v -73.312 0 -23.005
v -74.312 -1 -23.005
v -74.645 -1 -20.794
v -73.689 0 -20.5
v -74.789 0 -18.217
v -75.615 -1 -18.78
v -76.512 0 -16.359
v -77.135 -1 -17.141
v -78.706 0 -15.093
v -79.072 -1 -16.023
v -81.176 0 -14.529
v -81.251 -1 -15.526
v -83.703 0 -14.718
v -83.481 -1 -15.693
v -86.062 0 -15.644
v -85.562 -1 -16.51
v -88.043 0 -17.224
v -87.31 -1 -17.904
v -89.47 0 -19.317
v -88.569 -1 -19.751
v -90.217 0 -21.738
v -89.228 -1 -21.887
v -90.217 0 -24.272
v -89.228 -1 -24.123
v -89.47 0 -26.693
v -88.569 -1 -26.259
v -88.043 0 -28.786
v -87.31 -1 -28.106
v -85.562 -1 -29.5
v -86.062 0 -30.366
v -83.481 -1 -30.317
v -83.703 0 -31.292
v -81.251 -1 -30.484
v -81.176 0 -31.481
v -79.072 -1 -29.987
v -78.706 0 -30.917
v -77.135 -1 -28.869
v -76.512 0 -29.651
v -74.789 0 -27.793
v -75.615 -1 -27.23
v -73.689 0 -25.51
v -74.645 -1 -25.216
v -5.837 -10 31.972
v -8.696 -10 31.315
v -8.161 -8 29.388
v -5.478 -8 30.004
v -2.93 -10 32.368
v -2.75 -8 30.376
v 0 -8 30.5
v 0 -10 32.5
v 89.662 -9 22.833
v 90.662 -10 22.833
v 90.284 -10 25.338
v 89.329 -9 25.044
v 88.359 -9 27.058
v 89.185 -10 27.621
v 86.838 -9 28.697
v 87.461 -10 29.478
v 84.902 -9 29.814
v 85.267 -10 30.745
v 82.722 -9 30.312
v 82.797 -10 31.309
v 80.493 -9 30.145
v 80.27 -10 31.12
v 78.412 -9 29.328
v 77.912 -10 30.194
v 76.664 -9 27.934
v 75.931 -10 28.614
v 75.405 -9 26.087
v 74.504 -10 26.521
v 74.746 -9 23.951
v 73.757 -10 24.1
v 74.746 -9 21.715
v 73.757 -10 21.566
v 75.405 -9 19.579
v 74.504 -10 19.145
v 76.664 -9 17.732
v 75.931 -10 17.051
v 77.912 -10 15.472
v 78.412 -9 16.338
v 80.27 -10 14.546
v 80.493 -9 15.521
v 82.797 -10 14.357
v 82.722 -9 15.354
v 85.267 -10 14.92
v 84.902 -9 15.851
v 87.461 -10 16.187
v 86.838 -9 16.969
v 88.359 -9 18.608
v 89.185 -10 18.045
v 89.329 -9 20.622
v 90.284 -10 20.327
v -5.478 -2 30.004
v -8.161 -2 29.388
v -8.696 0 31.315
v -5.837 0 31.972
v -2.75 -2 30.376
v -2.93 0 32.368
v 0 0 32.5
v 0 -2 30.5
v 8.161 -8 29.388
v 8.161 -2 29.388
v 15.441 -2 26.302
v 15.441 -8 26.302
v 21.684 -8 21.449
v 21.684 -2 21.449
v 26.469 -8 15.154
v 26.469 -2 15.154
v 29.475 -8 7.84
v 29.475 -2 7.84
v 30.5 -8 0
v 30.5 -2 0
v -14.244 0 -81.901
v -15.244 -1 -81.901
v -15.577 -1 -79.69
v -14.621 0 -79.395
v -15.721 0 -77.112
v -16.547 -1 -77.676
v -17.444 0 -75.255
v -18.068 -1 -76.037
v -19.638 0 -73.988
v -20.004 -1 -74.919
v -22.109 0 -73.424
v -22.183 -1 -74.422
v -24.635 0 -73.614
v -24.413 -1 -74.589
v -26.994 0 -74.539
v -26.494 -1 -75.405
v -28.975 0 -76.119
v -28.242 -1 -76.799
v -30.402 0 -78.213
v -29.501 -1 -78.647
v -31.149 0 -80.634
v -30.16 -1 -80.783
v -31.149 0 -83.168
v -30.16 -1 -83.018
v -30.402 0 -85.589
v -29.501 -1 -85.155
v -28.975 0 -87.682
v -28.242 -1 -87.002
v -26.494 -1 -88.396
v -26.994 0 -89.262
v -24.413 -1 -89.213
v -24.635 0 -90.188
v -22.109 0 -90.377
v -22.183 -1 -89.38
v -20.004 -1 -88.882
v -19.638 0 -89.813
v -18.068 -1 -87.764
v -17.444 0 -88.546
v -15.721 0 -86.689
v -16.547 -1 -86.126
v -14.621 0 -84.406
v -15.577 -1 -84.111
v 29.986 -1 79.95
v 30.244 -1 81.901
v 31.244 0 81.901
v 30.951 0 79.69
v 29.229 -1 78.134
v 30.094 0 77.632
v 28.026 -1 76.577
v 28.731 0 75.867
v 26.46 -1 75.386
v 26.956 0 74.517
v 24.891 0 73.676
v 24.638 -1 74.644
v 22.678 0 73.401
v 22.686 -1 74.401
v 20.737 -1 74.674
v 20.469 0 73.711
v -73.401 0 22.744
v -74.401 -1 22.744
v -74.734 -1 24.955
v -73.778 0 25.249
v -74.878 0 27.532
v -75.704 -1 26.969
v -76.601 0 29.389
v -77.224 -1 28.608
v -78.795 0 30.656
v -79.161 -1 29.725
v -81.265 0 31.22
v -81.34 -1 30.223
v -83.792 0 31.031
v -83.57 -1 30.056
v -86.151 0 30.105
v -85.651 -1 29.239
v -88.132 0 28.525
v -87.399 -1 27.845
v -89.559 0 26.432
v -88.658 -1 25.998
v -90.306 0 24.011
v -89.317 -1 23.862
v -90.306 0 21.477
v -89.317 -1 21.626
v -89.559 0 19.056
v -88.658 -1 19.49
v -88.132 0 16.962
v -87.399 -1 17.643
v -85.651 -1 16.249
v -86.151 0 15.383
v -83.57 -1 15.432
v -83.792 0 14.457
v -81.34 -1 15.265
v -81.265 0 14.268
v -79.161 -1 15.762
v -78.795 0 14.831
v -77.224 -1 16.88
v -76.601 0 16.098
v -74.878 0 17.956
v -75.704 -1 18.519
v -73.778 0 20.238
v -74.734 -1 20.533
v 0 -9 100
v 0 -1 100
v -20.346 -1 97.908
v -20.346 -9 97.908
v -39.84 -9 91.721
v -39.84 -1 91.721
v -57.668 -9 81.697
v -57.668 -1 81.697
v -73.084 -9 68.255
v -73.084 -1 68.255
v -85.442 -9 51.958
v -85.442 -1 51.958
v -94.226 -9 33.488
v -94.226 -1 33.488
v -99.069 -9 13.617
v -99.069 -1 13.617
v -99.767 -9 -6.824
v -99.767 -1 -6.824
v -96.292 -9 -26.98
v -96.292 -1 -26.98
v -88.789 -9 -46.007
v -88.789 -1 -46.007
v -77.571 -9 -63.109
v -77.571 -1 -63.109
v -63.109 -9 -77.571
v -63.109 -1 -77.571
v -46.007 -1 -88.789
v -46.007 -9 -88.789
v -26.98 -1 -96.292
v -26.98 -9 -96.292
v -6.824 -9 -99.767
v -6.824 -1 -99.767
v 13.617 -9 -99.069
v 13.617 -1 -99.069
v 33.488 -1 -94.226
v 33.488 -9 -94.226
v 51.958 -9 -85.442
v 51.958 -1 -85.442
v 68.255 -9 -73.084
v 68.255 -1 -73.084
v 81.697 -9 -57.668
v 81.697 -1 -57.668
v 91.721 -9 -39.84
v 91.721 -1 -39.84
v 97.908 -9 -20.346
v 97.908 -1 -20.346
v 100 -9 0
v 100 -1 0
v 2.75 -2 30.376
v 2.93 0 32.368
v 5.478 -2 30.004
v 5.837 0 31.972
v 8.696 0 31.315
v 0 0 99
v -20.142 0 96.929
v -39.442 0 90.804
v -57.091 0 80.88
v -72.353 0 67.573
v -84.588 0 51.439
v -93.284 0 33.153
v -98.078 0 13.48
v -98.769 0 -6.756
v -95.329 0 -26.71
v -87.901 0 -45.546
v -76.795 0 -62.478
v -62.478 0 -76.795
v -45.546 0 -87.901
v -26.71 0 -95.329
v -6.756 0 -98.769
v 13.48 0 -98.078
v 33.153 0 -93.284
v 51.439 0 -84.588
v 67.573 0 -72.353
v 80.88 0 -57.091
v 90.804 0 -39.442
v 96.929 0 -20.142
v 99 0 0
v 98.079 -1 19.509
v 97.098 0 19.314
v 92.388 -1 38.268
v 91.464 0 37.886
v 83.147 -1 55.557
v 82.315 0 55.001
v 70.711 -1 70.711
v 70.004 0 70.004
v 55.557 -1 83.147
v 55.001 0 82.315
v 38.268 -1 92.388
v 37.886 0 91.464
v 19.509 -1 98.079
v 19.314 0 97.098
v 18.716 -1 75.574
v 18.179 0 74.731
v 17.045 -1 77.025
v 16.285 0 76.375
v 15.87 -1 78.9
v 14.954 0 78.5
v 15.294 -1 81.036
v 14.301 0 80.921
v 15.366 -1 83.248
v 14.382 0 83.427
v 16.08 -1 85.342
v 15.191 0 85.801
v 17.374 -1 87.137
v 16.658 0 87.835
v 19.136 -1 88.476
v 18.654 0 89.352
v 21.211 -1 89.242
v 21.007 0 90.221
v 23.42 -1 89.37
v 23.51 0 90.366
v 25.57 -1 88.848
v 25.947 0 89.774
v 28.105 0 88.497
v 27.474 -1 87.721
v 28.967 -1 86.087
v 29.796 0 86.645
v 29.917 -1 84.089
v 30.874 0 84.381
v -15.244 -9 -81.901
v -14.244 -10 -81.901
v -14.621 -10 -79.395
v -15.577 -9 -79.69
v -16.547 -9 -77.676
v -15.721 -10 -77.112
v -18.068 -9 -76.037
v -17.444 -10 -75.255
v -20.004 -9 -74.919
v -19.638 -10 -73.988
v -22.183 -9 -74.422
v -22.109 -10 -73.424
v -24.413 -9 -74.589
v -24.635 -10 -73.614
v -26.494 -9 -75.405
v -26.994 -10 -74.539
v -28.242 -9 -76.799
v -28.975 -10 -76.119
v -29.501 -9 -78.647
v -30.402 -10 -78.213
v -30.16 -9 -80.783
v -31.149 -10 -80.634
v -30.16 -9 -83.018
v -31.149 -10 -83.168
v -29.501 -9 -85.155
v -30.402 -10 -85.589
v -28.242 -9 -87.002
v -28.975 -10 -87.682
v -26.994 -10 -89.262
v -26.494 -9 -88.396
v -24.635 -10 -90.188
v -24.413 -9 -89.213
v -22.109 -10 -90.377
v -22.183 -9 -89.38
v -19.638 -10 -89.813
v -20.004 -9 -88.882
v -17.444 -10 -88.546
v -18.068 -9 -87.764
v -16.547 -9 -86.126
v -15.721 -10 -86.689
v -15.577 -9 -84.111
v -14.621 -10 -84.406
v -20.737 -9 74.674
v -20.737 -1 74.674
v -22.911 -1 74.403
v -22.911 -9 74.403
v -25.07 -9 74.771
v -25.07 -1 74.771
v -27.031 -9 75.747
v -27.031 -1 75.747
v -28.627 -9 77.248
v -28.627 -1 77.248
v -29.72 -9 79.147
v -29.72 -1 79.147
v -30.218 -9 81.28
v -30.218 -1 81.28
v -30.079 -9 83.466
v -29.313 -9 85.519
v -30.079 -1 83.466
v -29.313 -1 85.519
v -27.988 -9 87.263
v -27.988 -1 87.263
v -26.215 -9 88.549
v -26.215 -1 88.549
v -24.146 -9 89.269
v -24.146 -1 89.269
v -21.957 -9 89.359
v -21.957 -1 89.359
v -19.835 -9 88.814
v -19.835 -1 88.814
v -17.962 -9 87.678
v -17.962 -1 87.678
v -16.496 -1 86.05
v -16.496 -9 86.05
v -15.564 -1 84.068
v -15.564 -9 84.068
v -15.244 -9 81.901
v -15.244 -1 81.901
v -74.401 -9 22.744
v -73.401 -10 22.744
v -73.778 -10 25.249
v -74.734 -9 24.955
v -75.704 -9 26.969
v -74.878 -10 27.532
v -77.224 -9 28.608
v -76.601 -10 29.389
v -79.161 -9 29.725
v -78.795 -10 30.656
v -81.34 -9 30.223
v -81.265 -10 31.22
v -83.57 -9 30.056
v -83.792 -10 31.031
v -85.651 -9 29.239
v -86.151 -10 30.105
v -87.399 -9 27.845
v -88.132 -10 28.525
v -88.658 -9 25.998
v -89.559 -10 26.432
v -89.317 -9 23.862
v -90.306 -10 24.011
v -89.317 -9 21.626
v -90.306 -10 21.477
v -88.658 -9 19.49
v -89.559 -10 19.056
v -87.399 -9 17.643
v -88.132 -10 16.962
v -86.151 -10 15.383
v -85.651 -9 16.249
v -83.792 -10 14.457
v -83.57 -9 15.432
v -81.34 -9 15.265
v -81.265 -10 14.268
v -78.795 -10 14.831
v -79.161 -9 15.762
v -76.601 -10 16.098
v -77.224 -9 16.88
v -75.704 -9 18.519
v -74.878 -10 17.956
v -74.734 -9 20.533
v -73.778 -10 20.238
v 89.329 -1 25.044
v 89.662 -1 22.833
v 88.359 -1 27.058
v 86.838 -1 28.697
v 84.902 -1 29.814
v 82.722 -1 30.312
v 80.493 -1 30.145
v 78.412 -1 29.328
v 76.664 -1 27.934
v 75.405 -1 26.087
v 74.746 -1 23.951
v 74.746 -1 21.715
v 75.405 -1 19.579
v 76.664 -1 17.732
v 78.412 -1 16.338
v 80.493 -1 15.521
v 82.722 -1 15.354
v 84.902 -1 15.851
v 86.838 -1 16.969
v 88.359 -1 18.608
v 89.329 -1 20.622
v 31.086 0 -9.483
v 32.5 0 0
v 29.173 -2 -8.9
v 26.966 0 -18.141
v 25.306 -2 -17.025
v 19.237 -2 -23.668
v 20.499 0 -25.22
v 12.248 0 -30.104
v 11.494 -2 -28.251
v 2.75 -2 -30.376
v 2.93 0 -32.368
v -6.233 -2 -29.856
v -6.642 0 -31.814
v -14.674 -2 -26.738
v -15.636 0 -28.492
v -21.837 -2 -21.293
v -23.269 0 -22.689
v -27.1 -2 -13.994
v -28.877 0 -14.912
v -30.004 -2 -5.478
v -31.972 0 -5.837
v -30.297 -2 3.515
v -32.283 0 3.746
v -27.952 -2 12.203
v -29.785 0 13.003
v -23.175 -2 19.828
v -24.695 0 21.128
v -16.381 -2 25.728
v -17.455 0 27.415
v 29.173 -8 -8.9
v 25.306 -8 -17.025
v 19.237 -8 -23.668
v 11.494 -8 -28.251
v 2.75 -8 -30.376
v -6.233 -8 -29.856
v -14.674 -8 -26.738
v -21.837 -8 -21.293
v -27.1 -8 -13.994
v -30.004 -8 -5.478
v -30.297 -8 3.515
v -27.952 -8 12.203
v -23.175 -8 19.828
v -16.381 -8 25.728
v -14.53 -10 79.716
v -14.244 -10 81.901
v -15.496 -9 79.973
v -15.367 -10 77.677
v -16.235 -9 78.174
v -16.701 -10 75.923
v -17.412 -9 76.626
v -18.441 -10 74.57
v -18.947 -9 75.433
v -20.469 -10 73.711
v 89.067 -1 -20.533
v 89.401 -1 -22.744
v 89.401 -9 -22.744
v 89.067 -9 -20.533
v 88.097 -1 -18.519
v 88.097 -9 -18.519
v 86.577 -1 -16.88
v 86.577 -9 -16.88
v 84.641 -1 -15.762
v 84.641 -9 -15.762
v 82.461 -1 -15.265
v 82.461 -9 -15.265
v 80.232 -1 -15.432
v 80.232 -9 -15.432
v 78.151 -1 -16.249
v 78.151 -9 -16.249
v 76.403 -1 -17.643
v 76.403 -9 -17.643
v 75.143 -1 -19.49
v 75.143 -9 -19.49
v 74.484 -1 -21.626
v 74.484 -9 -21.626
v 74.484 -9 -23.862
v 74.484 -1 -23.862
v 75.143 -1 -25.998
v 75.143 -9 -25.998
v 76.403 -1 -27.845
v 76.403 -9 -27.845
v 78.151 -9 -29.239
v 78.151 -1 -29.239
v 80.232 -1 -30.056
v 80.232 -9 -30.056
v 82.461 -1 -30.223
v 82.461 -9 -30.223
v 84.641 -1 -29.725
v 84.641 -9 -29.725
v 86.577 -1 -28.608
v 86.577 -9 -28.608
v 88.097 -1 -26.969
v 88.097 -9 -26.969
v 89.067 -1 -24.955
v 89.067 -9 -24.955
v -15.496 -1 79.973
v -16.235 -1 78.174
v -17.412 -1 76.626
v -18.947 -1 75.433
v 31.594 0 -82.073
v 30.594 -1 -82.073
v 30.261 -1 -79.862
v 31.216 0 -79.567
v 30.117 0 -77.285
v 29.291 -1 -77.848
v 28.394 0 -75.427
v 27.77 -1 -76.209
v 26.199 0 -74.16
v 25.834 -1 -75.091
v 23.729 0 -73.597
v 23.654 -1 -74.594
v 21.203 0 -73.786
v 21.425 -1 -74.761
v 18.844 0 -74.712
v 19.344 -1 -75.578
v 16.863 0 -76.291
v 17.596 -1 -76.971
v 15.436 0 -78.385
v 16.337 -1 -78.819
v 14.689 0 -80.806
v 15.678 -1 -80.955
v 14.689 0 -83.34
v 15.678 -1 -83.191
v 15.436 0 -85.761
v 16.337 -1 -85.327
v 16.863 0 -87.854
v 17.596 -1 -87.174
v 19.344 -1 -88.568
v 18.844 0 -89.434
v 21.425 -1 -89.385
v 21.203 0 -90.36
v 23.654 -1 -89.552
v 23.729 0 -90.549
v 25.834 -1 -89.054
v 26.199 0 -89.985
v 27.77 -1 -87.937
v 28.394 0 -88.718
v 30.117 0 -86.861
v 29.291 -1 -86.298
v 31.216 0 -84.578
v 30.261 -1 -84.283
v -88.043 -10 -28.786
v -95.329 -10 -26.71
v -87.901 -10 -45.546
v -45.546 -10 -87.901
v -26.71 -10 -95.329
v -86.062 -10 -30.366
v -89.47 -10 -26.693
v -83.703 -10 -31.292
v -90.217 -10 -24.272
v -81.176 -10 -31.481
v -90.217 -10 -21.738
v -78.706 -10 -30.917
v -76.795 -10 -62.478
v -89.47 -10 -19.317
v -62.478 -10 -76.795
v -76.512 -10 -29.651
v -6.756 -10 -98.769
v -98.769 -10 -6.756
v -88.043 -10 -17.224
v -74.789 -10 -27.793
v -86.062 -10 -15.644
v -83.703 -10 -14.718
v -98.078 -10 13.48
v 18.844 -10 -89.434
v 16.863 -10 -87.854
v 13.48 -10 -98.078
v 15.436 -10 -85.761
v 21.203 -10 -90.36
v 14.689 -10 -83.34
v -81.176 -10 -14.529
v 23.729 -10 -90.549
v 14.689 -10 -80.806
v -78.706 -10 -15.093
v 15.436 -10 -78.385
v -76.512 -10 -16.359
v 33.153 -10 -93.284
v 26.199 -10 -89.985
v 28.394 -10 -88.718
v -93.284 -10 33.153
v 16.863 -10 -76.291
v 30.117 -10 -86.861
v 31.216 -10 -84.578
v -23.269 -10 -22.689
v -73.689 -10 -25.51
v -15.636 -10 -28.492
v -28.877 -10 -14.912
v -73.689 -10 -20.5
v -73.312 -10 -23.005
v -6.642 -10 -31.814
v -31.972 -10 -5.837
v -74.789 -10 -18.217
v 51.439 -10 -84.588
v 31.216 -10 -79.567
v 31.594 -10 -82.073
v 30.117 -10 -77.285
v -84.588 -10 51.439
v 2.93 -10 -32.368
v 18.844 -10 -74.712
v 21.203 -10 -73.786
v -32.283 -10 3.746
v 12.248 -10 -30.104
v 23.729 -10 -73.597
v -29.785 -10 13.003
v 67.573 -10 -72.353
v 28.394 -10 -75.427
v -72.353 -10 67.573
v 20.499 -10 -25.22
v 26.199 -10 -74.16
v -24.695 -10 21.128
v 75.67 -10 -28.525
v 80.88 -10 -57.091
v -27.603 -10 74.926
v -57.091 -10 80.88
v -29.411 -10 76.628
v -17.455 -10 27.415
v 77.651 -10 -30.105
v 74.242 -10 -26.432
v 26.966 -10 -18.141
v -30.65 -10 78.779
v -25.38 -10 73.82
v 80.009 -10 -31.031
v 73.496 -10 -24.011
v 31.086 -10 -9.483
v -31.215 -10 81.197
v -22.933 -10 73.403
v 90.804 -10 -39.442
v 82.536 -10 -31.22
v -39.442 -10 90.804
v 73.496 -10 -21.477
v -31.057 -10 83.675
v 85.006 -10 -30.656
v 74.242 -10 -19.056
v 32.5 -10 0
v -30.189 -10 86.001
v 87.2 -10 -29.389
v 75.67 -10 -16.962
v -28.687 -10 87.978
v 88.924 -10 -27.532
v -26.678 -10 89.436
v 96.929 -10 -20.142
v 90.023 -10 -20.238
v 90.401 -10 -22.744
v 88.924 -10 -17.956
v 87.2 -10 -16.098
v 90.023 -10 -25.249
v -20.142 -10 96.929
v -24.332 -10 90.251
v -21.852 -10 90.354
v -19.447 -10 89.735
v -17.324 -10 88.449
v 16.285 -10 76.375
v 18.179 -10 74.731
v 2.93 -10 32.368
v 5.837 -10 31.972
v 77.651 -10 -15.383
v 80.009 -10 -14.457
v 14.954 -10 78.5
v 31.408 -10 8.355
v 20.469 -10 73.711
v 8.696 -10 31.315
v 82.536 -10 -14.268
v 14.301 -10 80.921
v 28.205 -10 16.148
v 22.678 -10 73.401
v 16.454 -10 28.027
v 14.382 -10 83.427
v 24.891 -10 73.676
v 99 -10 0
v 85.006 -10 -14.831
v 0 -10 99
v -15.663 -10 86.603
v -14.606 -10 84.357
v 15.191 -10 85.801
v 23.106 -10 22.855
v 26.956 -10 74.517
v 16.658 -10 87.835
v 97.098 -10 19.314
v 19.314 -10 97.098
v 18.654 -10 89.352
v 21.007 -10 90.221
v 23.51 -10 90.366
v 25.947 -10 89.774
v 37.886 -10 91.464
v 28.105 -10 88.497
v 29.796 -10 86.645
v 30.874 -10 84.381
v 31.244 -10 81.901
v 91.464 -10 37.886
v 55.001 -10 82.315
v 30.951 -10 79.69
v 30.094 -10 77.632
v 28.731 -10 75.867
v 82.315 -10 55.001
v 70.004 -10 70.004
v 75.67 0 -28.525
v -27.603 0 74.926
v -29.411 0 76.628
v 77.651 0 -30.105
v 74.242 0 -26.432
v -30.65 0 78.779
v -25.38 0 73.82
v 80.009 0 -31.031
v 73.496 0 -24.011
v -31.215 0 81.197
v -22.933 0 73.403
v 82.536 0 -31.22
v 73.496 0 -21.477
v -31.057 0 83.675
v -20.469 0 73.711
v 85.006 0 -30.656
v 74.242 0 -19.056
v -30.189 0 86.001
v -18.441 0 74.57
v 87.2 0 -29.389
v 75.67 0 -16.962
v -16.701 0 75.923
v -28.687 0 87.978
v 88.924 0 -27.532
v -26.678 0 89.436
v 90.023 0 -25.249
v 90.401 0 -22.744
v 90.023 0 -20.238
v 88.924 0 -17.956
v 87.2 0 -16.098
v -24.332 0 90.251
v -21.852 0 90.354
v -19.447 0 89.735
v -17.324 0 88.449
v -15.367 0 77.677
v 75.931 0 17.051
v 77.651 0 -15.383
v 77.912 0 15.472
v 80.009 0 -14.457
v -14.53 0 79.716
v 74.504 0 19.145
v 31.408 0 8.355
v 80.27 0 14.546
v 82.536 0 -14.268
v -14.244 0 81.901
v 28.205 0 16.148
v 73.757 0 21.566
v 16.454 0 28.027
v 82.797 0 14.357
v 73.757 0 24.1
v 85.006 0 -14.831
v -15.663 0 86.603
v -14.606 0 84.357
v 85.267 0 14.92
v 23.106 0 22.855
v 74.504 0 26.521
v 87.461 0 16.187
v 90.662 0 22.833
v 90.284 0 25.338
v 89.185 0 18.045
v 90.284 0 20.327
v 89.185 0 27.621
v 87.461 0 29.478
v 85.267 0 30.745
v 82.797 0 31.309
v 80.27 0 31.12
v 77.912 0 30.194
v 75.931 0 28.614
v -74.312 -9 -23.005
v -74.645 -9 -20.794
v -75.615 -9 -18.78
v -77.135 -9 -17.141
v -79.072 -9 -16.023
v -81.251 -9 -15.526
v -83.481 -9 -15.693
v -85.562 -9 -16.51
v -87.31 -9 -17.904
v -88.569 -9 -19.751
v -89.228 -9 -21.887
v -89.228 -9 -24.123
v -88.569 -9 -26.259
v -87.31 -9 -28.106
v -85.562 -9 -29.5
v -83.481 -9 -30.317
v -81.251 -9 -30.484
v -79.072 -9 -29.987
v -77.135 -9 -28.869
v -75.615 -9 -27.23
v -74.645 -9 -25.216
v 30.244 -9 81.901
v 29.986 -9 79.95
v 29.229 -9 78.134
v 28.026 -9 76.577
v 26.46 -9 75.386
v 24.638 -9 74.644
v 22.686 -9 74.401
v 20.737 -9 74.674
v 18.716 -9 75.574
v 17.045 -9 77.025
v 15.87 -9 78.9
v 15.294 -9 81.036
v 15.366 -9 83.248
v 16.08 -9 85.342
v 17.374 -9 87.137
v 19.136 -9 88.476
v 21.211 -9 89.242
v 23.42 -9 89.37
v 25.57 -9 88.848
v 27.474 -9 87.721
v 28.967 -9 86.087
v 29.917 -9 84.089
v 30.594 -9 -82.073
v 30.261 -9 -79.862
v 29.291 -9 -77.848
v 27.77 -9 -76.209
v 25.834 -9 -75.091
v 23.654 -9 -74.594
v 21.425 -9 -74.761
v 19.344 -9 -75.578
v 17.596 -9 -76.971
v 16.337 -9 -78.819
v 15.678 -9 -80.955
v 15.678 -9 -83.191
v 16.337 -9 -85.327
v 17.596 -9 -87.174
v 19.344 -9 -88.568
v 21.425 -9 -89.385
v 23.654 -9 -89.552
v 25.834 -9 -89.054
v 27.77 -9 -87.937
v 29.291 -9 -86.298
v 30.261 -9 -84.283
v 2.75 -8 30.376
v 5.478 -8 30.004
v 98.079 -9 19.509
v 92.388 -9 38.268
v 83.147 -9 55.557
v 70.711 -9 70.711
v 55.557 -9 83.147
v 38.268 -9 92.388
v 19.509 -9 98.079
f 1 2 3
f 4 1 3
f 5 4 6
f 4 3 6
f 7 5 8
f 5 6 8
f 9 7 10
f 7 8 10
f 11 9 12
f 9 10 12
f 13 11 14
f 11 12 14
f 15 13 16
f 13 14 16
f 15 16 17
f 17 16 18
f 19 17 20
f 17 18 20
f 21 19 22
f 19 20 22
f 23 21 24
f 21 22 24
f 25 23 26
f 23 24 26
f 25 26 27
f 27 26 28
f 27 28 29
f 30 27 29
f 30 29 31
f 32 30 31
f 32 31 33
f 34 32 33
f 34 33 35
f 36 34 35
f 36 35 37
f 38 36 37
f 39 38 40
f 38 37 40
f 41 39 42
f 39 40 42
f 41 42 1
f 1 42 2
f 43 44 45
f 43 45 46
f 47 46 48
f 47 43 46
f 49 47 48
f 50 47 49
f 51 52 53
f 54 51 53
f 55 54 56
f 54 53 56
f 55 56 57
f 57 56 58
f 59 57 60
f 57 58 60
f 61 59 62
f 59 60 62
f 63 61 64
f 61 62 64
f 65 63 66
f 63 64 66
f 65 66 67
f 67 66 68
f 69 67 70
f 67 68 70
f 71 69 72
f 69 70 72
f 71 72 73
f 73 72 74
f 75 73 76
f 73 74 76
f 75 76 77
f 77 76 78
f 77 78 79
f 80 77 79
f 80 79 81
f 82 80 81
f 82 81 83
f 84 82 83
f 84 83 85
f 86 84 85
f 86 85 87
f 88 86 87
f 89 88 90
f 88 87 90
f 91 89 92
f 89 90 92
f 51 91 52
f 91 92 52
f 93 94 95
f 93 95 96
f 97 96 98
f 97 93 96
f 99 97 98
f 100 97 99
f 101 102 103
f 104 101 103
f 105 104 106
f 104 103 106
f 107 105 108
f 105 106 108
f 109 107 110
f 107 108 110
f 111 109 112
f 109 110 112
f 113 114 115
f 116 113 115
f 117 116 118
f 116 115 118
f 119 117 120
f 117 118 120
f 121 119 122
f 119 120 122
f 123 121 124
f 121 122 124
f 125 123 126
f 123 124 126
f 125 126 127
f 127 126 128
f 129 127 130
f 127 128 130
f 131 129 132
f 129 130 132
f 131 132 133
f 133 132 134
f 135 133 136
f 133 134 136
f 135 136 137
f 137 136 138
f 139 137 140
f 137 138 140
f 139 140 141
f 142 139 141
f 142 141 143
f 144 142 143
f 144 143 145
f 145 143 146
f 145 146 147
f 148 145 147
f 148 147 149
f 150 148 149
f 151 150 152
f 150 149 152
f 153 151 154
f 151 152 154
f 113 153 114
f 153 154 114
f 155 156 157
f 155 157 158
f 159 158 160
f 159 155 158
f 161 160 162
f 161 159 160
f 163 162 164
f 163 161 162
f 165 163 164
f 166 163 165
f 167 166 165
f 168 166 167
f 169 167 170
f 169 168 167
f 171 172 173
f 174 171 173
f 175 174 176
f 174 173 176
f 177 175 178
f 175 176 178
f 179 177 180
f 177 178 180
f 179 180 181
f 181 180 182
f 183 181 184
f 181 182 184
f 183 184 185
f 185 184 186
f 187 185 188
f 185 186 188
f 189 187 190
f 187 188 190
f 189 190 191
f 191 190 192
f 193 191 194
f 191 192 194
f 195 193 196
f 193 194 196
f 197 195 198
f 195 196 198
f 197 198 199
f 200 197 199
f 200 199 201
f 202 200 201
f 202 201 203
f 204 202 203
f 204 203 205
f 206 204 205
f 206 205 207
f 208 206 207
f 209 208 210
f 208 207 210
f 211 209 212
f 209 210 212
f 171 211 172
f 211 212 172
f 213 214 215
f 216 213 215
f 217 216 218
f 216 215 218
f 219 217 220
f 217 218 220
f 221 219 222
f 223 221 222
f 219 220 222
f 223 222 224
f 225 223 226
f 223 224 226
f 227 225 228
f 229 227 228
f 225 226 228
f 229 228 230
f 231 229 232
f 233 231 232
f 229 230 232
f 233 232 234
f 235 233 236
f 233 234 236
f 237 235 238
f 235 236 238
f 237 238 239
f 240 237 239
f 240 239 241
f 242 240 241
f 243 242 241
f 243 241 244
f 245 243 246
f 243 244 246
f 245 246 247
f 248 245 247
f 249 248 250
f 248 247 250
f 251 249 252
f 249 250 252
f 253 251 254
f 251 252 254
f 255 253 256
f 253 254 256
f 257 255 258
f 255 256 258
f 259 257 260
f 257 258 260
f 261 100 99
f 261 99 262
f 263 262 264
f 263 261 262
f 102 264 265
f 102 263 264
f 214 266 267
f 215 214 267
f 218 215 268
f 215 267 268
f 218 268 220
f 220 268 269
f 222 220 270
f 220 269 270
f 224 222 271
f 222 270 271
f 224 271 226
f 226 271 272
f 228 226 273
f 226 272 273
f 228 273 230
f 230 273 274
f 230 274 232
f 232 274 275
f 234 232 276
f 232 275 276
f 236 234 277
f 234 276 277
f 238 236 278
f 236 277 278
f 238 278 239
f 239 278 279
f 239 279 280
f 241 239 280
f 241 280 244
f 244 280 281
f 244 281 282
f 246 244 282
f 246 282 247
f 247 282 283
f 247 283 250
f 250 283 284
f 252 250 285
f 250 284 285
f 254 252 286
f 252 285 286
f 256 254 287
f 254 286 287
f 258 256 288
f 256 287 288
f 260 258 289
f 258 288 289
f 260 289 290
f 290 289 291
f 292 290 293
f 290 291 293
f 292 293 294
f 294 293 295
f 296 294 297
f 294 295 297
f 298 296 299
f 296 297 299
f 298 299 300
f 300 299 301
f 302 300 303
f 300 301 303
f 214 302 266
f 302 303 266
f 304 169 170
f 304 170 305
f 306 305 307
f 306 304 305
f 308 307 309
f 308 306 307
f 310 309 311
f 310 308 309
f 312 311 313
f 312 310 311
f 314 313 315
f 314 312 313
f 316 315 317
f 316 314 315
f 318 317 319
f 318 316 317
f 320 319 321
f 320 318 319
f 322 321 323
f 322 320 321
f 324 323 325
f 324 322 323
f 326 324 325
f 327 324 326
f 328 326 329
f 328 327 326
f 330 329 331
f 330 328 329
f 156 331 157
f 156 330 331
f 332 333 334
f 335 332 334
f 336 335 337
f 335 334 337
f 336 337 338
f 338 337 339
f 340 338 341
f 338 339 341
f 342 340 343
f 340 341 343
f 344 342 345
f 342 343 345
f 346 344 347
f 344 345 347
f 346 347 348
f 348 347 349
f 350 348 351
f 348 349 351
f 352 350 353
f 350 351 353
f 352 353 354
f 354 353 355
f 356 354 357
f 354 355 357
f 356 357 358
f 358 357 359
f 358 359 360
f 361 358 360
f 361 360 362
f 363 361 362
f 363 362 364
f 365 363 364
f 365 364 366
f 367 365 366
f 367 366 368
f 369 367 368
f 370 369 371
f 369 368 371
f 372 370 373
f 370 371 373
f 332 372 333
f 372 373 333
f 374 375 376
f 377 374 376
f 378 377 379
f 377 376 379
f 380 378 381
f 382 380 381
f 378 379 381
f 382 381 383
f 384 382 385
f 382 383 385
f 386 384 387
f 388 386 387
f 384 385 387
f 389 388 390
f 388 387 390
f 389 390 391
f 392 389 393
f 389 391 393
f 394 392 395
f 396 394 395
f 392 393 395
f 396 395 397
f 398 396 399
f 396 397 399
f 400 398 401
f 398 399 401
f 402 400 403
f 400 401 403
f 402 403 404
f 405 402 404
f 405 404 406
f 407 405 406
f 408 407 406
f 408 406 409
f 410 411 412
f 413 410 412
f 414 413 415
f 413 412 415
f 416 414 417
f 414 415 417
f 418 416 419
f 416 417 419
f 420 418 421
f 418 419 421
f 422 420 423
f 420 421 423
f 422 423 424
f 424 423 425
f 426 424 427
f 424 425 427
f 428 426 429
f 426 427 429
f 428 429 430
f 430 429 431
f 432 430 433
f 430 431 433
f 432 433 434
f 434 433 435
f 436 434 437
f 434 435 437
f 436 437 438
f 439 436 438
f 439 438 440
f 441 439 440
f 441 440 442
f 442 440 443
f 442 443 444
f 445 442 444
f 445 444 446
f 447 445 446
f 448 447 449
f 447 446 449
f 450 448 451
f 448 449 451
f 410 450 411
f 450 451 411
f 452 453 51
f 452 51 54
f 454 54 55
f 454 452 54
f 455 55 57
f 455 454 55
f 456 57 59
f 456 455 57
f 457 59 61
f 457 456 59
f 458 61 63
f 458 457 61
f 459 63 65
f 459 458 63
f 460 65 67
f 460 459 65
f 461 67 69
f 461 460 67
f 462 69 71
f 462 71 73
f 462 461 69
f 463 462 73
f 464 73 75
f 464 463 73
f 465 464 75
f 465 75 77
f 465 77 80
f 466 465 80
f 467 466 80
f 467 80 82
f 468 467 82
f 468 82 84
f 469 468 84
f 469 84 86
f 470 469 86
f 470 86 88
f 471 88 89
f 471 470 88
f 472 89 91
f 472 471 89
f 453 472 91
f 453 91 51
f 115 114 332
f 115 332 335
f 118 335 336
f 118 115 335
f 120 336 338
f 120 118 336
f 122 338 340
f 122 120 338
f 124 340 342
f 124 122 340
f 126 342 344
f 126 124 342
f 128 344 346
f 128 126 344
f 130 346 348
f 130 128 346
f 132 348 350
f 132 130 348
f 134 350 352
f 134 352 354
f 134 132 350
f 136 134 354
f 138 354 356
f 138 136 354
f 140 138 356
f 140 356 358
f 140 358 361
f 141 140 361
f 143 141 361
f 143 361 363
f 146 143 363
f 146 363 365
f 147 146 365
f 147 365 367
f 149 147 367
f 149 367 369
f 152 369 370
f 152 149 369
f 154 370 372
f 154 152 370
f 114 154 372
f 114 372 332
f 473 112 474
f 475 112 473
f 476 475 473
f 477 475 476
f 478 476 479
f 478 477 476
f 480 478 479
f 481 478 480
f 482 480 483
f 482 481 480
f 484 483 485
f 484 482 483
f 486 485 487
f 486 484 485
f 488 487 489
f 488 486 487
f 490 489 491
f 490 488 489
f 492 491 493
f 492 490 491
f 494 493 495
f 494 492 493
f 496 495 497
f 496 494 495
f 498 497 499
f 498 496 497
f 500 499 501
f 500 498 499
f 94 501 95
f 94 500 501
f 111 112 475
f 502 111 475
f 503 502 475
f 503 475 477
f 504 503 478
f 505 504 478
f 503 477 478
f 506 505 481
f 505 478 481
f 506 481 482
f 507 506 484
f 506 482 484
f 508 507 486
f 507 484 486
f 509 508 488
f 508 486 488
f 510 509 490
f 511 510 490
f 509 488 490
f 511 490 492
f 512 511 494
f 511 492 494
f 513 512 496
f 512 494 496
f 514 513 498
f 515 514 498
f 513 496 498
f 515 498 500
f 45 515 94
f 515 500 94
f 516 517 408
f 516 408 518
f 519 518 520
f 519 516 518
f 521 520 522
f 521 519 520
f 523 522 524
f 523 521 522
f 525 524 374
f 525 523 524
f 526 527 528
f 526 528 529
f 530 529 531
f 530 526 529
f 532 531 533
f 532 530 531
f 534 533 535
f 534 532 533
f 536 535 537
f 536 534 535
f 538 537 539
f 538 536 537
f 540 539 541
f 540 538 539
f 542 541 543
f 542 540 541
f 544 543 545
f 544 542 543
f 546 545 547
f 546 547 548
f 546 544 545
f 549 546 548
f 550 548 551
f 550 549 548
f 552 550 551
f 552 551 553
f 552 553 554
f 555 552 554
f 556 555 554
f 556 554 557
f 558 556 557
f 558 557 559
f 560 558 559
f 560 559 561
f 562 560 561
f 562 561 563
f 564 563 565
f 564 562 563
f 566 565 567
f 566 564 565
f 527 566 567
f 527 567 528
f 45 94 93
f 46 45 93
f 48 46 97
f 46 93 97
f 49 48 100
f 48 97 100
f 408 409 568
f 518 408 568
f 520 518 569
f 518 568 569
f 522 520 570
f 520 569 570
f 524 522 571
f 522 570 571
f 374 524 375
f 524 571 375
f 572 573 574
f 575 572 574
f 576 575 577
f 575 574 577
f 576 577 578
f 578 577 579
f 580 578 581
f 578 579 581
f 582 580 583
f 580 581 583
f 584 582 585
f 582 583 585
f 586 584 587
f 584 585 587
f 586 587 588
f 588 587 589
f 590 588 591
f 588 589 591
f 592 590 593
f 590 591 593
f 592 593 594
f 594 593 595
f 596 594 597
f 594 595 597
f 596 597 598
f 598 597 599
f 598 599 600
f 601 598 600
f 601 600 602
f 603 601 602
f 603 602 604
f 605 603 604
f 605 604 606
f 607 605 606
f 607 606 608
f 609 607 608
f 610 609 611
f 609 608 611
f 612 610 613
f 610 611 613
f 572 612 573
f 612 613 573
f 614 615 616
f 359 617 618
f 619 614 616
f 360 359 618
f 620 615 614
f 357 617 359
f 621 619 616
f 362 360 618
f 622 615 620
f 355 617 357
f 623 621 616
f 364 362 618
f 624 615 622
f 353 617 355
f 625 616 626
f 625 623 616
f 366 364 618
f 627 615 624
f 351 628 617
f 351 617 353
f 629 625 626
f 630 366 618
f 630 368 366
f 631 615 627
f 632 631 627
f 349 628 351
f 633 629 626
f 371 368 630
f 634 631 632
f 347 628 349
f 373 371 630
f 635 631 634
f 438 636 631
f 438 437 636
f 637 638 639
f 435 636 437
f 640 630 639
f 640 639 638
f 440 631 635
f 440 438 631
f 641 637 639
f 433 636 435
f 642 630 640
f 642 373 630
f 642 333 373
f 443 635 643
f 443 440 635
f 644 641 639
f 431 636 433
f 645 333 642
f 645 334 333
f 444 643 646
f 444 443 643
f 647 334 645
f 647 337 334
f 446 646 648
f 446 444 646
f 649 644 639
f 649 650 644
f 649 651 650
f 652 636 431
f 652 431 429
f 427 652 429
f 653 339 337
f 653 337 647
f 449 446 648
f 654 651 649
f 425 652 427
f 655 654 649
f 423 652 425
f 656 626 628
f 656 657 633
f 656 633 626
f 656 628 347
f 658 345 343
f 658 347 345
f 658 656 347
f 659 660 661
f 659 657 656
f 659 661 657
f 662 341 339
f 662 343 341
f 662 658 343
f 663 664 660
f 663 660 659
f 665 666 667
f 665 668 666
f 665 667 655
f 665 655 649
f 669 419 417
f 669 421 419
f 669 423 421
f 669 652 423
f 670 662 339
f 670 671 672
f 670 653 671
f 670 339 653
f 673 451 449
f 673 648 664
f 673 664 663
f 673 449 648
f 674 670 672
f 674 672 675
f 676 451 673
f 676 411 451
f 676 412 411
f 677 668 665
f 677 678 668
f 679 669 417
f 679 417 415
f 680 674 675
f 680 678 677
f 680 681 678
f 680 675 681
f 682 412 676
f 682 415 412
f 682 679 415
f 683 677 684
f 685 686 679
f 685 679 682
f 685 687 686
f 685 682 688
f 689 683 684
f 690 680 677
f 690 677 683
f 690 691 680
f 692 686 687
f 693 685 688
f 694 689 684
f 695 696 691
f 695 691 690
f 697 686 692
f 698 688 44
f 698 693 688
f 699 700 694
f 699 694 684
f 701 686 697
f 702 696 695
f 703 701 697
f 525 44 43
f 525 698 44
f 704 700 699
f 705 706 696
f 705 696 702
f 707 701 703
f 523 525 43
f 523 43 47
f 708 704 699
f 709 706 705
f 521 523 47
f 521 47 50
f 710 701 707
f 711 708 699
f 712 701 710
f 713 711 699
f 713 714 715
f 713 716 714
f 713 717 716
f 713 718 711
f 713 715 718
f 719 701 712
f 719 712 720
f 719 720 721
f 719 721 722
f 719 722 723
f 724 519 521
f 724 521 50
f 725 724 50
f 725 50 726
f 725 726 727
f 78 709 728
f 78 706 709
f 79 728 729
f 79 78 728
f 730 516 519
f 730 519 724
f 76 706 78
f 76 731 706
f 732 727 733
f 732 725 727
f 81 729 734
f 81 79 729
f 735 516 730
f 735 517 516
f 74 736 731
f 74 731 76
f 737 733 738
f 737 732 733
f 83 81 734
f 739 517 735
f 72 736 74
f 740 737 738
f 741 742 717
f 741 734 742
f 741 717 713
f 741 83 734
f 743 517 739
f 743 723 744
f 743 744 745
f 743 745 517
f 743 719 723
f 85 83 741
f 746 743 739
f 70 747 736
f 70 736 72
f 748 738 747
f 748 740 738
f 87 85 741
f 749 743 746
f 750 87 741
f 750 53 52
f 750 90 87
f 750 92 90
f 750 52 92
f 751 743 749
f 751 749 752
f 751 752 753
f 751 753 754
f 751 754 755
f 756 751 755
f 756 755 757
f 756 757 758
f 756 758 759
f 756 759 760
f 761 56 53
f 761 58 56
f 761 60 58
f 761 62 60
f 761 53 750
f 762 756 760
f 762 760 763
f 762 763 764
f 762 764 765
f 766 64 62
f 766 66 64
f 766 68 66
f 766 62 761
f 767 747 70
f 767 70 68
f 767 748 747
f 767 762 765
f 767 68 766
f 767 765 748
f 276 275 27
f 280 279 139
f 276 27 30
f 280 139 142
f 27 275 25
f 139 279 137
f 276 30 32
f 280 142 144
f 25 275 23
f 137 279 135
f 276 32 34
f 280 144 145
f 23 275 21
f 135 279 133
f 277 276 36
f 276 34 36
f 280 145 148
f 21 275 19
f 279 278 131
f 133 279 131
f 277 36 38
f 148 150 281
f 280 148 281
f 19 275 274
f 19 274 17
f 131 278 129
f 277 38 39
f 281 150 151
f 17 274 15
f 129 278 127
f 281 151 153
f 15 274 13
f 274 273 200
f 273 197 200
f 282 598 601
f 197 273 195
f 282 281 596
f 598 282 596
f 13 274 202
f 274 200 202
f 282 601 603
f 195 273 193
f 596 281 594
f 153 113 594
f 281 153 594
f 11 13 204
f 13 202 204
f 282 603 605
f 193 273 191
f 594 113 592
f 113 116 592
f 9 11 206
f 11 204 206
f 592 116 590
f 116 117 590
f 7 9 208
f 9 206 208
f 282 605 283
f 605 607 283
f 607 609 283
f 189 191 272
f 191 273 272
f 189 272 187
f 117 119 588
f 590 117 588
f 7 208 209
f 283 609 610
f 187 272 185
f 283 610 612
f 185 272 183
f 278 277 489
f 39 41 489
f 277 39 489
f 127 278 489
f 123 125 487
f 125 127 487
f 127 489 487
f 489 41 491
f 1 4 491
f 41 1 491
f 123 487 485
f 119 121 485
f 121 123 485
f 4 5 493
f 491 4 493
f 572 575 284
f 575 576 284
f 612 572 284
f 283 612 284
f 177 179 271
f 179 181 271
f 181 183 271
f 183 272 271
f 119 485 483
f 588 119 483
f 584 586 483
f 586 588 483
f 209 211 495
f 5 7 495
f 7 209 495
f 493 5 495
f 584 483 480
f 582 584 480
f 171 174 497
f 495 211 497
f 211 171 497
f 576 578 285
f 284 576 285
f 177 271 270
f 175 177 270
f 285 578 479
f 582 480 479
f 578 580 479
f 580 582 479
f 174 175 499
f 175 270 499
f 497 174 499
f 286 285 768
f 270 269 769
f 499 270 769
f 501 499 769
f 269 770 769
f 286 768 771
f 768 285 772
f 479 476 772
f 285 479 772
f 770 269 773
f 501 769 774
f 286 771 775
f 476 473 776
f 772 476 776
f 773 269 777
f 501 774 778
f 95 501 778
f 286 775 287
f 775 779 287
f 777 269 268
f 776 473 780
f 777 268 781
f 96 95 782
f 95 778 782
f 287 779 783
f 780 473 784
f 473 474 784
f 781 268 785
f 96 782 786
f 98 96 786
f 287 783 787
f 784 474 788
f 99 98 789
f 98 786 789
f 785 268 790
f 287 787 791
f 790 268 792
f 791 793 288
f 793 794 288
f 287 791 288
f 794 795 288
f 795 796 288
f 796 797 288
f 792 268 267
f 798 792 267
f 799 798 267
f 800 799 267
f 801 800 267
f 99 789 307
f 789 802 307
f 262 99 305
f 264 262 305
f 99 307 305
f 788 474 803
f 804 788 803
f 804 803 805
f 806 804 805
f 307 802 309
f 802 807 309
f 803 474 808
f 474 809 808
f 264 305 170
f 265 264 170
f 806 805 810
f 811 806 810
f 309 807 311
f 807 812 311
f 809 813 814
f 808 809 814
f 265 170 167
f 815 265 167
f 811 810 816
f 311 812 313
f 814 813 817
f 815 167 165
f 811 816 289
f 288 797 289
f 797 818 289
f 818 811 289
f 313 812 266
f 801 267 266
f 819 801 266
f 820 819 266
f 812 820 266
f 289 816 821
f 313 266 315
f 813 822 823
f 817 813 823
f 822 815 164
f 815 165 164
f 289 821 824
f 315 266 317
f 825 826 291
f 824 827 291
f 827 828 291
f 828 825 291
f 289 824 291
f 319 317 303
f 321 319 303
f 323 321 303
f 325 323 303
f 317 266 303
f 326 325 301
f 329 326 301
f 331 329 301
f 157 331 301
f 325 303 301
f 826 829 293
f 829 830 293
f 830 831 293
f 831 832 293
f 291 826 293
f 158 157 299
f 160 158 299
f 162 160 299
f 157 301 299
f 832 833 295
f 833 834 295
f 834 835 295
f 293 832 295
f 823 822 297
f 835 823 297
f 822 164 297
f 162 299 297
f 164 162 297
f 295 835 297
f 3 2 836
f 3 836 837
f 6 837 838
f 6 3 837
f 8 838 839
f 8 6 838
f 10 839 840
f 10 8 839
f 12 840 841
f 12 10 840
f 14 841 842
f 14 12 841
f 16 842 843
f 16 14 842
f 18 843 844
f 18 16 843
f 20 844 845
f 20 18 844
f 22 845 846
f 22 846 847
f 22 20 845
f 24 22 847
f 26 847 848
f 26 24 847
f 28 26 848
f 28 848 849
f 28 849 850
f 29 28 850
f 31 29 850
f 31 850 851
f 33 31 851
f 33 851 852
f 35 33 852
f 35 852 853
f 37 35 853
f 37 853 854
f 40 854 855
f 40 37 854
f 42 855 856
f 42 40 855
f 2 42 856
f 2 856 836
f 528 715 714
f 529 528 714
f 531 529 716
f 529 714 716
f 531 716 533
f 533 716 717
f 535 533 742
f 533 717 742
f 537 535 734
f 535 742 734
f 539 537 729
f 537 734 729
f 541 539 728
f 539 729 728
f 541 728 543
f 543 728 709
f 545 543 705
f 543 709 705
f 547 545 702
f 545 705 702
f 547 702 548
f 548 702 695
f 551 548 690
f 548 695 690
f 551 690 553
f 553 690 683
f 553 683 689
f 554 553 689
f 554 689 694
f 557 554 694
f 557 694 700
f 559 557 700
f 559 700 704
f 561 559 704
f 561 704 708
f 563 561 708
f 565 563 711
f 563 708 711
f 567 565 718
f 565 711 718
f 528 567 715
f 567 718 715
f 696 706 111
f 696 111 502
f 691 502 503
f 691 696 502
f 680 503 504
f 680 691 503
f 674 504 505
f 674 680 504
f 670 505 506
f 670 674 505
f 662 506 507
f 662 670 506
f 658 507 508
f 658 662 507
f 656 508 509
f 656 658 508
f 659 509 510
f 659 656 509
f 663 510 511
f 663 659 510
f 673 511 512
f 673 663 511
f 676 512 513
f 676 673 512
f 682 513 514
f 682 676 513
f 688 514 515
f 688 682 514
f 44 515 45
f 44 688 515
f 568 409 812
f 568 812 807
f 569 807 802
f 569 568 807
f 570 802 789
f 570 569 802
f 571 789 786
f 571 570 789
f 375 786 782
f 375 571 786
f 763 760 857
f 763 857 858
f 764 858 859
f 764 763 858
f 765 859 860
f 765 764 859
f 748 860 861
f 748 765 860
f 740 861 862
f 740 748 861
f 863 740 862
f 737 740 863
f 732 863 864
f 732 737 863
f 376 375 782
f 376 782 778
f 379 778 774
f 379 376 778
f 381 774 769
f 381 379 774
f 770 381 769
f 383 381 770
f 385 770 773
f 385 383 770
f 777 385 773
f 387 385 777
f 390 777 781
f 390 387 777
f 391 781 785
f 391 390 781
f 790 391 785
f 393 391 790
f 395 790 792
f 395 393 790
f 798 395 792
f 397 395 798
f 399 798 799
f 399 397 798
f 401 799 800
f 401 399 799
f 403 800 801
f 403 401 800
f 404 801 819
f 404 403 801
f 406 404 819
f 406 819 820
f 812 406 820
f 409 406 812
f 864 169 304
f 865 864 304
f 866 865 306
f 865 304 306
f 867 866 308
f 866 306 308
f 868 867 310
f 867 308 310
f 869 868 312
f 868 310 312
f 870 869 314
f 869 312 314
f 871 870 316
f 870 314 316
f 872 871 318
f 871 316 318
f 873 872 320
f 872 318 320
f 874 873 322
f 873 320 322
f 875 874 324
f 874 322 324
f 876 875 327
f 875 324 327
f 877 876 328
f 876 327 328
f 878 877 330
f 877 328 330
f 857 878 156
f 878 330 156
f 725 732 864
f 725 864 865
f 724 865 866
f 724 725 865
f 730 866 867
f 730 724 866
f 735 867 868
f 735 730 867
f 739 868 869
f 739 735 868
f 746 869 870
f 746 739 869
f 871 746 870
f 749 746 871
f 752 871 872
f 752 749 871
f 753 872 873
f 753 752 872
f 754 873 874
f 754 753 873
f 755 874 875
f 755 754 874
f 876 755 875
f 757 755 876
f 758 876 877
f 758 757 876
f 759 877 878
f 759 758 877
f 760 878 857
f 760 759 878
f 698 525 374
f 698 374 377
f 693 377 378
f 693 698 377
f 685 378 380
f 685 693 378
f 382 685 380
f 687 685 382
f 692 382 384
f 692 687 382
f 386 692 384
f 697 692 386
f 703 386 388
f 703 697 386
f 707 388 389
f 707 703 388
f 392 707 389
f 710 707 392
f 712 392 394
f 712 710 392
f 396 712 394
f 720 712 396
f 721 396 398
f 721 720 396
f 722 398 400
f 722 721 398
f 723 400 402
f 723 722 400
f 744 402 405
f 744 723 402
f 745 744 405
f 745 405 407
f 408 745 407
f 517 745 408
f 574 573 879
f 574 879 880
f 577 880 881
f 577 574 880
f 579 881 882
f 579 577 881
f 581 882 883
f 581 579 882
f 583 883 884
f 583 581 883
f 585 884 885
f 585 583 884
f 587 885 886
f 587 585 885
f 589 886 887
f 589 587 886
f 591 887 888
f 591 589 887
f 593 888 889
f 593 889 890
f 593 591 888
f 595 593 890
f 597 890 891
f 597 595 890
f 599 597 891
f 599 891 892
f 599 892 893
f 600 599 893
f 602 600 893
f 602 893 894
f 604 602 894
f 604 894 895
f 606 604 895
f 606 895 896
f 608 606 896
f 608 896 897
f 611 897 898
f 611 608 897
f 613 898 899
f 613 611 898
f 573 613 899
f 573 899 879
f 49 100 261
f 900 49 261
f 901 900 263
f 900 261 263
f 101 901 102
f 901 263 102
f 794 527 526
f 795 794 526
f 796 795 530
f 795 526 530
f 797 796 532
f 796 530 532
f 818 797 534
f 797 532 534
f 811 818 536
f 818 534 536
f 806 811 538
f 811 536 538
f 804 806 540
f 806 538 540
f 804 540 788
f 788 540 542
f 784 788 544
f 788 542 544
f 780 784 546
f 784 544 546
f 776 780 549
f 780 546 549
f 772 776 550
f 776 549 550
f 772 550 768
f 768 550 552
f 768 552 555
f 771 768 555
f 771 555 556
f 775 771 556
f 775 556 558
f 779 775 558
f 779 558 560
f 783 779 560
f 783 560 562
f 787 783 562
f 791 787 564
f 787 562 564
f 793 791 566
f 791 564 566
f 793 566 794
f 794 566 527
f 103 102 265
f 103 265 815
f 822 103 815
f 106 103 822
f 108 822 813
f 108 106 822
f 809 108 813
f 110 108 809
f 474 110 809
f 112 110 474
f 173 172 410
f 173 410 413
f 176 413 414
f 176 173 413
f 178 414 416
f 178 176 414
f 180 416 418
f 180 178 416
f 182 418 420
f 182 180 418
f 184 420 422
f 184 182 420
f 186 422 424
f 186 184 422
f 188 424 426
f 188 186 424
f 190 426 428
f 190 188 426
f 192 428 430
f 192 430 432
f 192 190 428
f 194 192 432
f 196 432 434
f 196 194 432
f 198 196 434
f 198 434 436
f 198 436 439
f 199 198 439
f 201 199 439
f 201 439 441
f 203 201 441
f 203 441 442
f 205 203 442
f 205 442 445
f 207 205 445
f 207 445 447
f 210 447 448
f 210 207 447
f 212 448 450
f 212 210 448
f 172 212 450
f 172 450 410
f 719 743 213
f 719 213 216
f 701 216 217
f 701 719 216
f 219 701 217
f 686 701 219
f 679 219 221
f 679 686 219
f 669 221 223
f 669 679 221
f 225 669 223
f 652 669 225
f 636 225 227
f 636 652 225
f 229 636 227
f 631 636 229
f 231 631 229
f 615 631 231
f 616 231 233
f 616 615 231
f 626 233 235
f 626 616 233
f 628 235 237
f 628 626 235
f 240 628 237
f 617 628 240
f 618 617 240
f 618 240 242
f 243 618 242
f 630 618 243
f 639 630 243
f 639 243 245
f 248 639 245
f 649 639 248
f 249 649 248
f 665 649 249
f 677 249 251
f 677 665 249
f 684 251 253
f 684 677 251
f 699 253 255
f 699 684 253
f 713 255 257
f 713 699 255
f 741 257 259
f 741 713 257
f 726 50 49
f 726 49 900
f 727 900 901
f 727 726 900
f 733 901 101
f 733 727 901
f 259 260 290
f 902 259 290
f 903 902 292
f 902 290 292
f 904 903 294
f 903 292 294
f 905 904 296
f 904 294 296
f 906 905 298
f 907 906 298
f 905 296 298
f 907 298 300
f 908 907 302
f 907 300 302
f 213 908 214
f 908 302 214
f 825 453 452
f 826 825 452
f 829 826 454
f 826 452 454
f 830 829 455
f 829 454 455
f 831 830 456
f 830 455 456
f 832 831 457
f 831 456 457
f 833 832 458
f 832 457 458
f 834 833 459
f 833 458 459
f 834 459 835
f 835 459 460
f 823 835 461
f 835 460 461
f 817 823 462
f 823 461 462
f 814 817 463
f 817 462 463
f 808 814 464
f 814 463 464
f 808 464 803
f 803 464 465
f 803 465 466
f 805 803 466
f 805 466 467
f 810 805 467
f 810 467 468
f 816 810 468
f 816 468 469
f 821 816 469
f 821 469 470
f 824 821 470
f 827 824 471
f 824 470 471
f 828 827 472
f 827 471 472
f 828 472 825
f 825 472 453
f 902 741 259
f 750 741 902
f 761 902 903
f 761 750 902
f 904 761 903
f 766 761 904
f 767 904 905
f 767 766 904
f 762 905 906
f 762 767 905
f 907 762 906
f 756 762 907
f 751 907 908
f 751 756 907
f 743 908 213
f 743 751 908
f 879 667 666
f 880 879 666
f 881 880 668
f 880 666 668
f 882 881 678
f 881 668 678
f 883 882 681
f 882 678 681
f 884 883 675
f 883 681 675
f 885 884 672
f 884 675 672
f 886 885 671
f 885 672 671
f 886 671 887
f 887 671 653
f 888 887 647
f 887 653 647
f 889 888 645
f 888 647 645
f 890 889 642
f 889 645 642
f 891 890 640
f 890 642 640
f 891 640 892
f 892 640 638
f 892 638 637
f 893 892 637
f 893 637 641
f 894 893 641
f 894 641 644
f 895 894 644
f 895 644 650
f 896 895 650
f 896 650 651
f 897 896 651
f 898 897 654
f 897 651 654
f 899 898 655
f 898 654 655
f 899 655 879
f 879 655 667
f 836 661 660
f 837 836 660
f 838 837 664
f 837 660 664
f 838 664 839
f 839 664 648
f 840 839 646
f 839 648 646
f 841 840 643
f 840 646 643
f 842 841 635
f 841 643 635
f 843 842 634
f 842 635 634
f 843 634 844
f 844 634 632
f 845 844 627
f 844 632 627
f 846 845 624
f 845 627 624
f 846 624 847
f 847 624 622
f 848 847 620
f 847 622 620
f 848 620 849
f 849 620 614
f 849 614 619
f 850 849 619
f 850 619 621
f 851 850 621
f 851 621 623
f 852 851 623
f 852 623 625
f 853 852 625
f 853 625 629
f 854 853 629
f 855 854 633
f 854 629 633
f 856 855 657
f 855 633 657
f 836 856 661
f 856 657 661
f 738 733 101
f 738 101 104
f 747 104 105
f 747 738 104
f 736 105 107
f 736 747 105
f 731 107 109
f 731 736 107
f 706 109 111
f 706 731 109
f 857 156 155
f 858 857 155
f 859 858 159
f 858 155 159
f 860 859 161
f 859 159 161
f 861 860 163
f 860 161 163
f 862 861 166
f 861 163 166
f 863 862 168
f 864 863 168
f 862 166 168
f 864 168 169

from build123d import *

# Parameters (mm, degrees)
F0_R     = 7.5
F1_DEPTH = 10
F2_SIZE2 = 1
F2_SIZE  = 1
F3_SIZE2 = 1
F3_SIZE  = 1
F4_SIZE2 = 2
F4_SIZE  = 2
F5_SIZE2 = 2
F5_SIZE  = 2
F6_SIZE2 = 1
F6_SIZE  = 1
F7_SIZE2 = 1
F7_SIZE  = 1


with BuildPart() as f1:
    # F0 (on Front) → F1 (new body)
    with BuildSketch(Plane.XZ):
        with BuildLine():
            ThreePointArc((0, 100), (-70.710678, -70.710678), (100, 0))
            ThreePointArc((100, 0), (70.710678, 70.710678), (0, 100))
        make_face()
        with Locations((-22.743852, -81.900654)):
            Circle(F0_R, mode=Mode.SUBTRACT)
        with Locations((-81.811651, -23.00498)):
            Circle(F0_R, mode=Mode.SUBTRACT)
        with Locations((23.093983, -82.072779)):
            Circle(F0_R, mode=Mode.SUBTRACT)
        with Locations((81.900654, -22.743852)):
            Circle(F0_R, mode=Mode.SUBTRACT)
        with Locations((-81.900654, 22.743852)):
            Circle(F0_R, mode=Mode.SUBTRACT)
        with BuildLine():
            ThreePointArc((-15.243852, 81.900654), (-16.773045, 77.361992), (-20.737042, 74.674126))
            ThreePointArc((-20.737042, 74.674126), (-28.714659, 86.439317), (-15.243852, 81.900654))
        make_face(mode=Mode.SUBTRACT)
        with BuildLine():
            ThreePointArc((-8.161029, 29.387882), (-4.118228, 30.220692), (0, 30.5))
            ThreePointArc((0, 30.5), (4.118228, 30.220692), (8.161029, 29.387882))
            ThreePointArc((8.161029, 29.387882), (24.281283, 18.457229), (30.5, 0))
            ThreePointArc((30.5, 0), (-18.457229, -24.281283), (-8.161029, 29.387882))
        make_face(mode=Mode.SUBTRACT)
        with Locations((82.161782, 22.832855)):
            Circle(F0_R, mode=Mode.SUBTRACT)
        with BuildLine():
            ThreePointArc((30.243852, 81.900654), (27.282515, 75.929847), (20.737042, 74.674126))
            ThreePointArc((20.737042, 74.674126), (18.205189, 87.871462), (30.243852, 81.900654))
        make_face(mode=Mode.SUBTRACT)
    extrude(amount=F1_DEPTH)

    # F2
    f2_edges = [f1.edges().sort_by_distance(p)[0] for p in [
        (-100, 0, 0),
    ]]
    chamfer(f2_edges, length=F2_SIZE, length2=F2_SIZE2)

    # F3
    f3_edges = [f1.edges().sort_by_distance(p)[0] for p in [
        (-100, -10, 0),
    ]]
    chamfer(f3_edges, length=F3_SIZE, length2=F3_SIZE2)

    # F4
    f4_edges = [f1.edges().sort_by_distance(p)[0] for p in [
        (8.161029, 0, -29.387882),
    ]]
    chamfer(f4_edges, length=F4_SIZE, length2=F4_SIZE2)

    # F5
    f5_edges = [f1.edges().sort_by_distance(p)[0] for p in [
        (8.161029, -10, -29.387882),
    ]]
    chamfer(f5_edges, length=F5_SIZE, length2=F5_SIZE2)

    # F6
    f6_edges = [f1.edges().sort_by_distance(p)[0] for p in [
        (15.243852, 0, 81.900654),
        (-30.243852, 0, 81.900654),
        (-89.400654, 0, 22.743852),
        (-89.311651, 0, -23.00498),
        (-30.243852, 0, -81.900654),
        (15.593983, 0, -82.072779),
        (74.400654, 0, -22.743852),
        (74.661782, 0, 22.832855),
    ]]
    chamfer(f6_edges, length=F6_SIZE, length2=F6_SIZE2)

    # F7
    f7_edges = [f1.edges().sort_by_distance(p)[0] for p in [
        (-30.243852, -10, 81.900654),
        (15.243852, -10, 81.900654),
        (74.661782, -10, 22.832855),
        (74.400654, -10, -22.743852),
        (15.593983, -10, -82.072779),
        (-30.243852, -10, -81.900654),
        (-89.400654, -10, 22.743852),
        (-89.311651, -10, -23.00498),
    ]]
    chamfer(f7_edges, length=F7_SIZE, length2=F7_SIZE2)


solid = f1.part
